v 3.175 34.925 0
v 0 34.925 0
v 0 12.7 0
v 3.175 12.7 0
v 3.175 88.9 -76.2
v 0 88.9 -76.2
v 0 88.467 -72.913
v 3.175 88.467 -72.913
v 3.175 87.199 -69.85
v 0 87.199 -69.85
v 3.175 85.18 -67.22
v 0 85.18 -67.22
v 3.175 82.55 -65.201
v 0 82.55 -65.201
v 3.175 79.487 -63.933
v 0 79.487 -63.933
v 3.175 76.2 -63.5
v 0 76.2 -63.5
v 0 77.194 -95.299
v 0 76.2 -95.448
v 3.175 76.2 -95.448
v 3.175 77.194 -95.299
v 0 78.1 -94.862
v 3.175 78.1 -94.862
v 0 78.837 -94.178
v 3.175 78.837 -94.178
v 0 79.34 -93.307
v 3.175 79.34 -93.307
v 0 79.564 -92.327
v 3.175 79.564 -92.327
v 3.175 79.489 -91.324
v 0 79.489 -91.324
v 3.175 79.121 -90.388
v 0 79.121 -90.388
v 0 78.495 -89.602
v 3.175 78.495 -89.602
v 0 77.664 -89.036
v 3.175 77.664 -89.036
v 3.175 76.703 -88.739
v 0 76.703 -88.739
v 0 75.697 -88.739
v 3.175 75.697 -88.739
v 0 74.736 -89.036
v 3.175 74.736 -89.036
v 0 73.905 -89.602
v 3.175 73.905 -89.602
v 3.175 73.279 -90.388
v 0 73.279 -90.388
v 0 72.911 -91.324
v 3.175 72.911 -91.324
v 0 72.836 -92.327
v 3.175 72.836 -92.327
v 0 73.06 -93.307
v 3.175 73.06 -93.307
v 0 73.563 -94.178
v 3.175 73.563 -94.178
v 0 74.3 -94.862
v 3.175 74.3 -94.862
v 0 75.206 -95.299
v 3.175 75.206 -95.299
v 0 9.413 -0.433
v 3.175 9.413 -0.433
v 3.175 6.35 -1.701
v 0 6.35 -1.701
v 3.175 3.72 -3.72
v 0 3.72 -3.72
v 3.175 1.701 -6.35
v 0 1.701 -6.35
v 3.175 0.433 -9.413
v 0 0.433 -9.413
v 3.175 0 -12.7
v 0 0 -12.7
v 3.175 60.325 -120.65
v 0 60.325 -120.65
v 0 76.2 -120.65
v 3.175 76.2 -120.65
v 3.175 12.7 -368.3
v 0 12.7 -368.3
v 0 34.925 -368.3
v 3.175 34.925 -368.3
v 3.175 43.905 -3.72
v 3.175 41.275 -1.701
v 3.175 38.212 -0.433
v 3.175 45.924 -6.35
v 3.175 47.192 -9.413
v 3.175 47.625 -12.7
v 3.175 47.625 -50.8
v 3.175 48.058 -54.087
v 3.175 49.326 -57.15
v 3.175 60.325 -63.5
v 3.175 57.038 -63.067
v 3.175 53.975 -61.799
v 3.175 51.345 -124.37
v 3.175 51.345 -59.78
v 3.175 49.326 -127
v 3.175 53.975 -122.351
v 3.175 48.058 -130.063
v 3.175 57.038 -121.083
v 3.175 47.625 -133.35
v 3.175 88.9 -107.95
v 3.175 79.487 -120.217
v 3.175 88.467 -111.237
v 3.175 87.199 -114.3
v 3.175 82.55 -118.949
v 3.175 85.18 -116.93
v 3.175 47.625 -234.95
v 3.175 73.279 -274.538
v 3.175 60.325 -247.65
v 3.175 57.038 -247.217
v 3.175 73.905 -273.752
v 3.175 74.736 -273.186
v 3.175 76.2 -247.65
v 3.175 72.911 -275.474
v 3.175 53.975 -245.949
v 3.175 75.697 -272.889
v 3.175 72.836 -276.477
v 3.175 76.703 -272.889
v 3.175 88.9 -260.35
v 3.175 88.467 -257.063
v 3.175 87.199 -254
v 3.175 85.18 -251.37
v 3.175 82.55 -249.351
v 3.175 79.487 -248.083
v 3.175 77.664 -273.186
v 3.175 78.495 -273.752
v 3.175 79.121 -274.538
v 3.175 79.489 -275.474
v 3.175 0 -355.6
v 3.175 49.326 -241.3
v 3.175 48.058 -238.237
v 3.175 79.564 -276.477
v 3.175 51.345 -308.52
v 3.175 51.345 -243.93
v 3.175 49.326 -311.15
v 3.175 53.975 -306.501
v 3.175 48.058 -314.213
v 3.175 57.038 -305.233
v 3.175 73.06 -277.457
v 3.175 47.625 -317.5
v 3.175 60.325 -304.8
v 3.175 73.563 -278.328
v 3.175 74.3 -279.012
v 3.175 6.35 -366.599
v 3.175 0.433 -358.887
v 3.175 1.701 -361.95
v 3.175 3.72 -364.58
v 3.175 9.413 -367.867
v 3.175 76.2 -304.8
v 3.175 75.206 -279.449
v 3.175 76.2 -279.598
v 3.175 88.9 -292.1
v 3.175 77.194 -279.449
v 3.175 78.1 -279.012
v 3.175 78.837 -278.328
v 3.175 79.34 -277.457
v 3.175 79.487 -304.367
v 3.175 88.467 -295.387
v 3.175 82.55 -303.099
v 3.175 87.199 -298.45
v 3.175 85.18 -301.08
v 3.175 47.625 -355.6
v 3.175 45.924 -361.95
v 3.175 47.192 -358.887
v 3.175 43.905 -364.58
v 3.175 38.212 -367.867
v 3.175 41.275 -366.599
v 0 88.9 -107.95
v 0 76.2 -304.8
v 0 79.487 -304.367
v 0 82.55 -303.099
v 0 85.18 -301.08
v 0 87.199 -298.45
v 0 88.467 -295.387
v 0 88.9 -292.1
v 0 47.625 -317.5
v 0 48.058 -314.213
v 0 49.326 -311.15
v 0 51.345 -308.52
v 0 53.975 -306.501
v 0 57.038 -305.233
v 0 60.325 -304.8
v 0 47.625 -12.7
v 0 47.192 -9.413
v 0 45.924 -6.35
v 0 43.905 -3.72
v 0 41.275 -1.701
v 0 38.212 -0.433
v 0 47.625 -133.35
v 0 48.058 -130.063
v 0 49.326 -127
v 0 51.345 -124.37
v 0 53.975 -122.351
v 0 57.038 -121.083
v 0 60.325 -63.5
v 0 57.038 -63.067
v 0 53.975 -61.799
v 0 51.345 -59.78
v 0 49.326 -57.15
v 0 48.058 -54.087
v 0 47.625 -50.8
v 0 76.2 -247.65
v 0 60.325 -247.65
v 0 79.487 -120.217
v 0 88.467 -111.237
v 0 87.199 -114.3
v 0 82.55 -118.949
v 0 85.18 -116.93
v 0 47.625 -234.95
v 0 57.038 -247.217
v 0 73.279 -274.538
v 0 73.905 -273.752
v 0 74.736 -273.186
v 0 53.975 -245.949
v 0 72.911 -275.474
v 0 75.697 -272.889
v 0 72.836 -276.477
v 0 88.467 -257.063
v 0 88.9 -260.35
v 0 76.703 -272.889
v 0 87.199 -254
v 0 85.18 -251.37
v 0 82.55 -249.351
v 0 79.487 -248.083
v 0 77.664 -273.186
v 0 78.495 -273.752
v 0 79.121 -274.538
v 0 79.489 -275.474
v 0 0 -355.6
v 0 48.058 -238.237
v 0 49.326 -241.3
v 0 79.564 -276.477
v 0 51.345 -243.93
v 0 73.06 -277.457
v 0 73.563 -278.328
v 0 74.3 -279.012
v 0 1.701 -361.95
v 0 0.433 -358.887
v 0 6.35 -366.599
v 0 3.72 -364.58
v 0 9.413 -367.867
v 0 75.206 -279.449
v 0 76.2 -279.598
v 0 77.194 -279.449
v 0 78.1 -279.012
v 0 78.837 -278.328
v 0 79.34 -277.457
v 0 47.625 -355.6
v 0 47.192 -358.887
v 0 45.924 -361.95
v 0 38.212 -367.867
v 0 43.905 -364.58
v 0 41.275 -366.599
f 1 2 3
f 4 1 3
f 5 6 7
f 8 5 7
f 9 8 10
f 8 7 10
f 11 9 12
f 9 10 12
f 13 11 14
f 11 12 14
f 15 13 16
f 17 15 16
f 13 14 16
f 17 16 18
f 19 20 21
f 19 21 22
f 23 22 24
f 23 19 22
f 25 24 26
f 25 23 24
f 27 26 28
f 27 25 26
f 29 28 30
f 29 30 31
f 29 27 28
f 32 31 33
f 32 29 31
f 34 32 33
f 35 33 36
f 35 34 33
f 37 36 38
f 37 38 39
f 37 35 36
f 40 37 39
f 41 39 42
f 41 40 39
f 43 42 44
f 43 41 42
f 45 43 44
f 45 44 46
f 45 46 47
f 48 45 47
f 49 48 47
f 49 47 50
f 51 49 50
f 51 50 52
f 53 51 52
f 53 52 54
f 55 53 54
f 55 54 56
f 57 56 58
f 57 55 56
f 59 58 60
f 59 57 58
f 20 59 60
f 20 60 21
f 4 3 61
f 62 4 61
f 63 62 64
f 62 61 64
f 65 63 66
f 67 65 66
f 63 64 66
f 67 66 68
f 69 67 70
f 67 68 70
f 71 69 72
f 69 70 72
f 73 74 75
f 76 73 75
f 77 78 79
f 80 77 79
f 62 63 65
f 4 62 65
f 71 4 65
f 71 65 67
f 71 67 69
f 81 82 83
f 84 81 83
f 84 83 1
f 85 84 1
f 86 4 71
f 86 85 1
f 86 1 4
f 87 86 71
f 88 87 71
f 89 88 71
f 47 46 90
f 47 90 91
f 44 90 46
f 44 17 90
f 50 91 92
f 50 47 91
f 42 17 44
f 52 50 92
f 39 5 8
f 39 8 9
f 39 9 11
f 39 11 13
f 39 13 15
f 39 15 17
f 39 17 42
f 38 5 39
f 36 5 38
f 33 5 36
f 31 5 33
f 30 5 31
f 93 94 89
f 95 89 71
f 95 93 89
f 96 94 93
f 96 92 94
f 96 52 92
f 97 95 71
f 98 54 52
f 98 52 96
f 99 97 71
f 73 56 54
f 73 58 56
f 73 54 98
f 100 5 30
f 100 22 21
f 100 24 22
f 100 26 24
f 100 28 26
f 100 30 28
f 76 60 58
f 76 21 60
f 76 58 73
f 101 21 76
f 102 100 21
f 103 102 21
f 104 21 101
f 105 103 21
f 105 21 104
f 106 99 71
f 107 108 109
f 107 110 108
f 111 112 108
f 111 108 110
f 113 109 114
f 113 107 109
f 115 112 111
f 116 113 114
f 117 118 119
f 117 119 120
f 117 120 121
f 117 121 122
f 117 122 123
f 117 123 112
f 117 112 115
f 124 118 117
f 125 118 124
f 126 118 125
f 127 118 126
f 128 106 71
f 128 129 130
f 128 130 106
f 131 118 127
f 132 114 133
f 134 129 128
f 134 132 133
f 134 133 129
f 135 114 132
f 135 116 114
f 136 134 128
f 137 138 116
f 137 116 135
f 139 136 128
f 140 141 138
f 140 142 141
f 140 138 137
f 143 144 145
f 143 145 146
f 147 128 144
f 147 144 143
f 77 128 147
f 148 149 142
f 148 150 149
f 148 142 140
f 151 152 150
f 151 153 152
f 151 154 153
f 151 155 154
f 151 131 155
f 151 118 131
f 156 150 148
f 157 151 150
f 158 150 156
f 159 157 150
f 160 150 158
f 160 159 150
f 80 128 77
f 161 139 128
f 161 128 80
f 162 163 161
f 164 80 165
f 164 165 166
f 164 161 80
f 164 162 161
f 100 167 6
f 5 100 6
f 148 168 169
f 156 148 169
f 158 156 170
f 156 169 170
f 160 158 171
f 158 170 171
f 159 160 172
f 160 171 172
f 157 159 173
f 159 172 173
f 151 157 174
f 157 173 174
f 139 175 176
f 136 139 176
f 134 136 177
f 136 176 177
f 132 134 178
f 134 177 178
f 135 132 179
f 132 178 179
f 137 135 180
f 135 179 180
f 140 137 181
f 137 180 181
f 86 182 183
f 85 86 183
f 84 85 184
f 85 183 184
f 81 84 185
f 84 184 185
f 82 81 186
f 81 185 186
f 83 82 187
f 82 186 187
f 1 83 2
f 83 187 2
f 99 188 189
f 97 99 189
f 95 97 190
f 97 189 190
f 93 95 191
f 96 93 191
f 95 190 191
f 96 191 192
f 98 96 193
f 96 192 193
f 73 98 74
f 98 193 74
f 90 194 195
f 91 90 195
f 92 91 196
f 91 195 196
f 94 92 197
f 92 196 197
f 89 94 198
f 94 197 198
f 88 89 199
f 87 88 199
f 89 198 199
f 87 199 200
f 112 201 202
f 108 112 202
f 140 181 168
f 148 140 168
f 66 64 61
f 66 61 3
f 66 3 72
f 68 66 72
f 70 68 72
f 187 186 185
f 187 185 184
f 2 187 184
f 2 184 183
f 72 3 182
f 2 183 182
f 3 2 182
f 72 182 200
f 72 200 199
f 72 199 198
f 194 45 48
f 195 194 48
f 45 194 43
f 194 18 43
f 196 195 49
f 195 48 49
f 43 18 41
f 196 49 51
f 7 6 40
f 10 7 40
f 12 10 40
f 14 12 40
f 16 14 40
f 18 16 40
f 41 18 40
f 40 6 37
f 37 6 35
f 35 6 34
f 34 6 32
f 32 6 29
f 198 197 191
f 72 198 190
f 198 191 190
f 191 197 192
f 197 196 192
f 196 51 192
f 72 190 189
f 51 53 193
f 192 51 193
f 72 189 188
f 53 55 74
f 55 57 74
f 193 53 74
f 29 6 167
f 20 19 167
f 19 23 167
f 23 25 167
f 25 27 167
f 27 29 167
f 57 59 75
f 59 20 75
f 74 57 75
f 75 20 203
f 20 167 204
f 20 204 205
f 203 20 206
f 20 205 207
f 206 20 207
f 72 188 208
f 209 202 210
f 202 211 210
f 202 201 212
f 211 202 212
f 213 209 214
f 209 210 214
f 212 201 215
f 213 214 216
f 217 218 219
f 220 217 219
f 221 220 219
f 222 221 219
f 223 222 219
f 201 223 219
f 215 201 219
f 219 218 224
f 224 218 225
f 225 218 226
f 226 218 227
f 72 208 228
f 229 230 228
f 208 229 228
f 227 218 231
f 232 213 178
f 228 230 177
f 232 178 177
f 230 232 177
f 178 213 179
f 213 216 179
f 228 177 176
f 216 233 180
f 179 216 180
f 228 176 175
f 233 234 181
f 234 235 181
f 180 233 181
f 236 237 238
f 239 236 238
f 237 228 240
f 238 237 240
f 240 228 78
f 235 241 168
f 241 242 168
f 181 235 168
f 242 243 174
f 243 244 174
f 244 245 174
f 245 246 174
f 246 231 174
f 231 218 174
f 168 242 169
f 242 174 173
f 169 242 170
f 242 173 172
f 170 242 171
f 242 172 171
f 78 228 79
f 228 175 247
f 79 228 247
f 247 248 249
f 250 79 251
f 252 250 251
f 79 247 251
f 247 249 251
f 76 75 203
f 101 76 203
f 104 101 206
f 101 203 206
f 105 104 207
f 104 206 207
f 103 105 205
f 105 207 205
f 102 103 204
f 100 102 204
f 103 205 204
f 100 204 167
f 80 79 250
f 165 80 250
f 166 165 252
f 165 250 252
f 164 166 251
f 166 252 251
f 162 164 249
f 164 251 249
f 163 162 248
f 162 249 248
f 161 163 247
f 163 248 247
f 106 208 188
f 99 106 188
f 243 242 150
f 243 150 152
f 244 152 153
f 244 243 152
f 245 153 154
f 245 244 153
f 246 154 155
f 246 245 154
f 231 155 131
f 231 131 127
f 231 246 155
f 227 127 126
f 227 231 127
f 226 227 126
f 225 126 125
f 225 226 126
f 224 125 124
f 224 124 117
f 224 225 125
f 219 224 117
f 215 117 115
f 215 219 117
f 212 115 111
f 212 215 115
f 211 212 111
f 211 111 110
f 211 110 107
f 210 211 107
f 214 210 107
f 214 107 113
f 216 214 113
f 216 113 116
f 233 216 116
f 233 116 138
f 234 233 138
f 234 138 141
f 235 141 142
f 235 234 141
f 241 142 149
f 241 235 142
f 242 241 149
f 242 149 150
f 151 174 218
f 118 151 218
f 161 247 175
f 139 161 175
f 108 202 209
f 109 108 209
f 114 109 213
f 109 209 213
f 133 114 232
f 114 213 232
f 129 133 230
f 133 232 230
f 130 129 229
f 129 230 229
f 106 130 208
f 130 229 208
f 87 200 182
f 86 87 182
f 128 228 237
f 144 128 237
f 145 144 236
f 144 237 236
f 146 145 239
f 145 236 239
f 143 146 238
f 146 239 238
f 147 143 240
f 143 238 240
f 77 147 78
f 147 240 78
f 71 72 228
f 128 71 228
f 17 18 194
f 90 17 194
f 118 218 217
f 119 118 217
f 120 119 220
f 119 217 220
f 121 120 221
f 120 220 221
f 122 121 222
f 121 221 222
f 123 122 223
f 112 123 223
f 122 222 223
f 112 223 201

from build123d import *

# Parameters (mm, degrees)
SKETCH1_R           = 3.3734375
BOSS_EXTRUDE1_DEPTH = 3.175


with BuildPart() as part:
    # Sketch1 → Boss-Extrude1 (new body)
    with BuildSketch(Plane(origin=(0, 0, 0), x_dir=(0, 0, -1), z_dir=(1, 0, 0))):
        with BuildLine():
            Line((12.7, 0), (355.6, 0))
            ThreePointArc((355.6, 0), (364.580256121, 3.719743879), (368.3, 12.7))
            Line((368.3, 12.7), (368.3, 34.925))
            ThreePointArc((368.3, 34.925), (364.580256121, 43.905256121), (355.6, 47.625))
            Line((355.6, 47.625), (317.5, 47.625))
            ThreePointArc((317.5, 47.625), (308.519743879, 51.344743879), (304.8, 60.325))
            Line((304.8, 60.325), (304.8, 76.2))
            ThreePointArc((304.8, 76.2), (301.080256121, 85.180256121), (292.1, 88.9))
            Line((292.1, 88.9), (260.35, 88.9))
            ThreePointArc((260.35, 88.9), (251.369743879, 85.180256121), (247.65, 76.2))
            Line((247.65, 76.2), (247.65, 60.325))
            ThreePointArc((247.65, 60.325), (243.930256121, 51.344743879), (234.95, 47.625))
            Line((234.95, 47.625), (133.35, 47.625))
            ThreePointArc((133.35, 47.625), (124.369743879, 51.344743879), (120.65, 60.325))
            Line((120.65, 60.325), (120.65, 76.2))
            ThreePointArc((120.65, 76.2), (116.930256121, 85.180256121), (107.95, 88.9))
            Line((107.95, 88.9), (76.2, 88.9))
            ThreePointArc((76.2, 88.9), (67.219743879, 85.180256121), (63.5, 76.2))
            Line((63.5, 76.2), (63.5, 60.325))
            ThreePointArc((63.5, 60.325), (59.780256121, 51.344743879), (50.8, 47.625))
            Line((50.8, 47.625), (12.7, 47.625))
            ThreePointArc((12.7, 47.625), (3.719743879, 43.905256121), (0, 34.925))
            Line((0, 34.925), (0, 12.7))
            ThreePointArc((0, 12.7), (3.719743879, 3.719743879), (12.7, 0))
        make_face()
        with Locations((92.075, 76.2)):
            Circle(SKETCH1_R, mode=Mode.SUBTRACT)
        with Locations((276.225, 76.2)):
            Circle(SKETCH1_R, mode=Mode.SUBTRACT)
    extrude(amount=BOSS_EXTRUDE1_DEPTH)


solid = part.part
